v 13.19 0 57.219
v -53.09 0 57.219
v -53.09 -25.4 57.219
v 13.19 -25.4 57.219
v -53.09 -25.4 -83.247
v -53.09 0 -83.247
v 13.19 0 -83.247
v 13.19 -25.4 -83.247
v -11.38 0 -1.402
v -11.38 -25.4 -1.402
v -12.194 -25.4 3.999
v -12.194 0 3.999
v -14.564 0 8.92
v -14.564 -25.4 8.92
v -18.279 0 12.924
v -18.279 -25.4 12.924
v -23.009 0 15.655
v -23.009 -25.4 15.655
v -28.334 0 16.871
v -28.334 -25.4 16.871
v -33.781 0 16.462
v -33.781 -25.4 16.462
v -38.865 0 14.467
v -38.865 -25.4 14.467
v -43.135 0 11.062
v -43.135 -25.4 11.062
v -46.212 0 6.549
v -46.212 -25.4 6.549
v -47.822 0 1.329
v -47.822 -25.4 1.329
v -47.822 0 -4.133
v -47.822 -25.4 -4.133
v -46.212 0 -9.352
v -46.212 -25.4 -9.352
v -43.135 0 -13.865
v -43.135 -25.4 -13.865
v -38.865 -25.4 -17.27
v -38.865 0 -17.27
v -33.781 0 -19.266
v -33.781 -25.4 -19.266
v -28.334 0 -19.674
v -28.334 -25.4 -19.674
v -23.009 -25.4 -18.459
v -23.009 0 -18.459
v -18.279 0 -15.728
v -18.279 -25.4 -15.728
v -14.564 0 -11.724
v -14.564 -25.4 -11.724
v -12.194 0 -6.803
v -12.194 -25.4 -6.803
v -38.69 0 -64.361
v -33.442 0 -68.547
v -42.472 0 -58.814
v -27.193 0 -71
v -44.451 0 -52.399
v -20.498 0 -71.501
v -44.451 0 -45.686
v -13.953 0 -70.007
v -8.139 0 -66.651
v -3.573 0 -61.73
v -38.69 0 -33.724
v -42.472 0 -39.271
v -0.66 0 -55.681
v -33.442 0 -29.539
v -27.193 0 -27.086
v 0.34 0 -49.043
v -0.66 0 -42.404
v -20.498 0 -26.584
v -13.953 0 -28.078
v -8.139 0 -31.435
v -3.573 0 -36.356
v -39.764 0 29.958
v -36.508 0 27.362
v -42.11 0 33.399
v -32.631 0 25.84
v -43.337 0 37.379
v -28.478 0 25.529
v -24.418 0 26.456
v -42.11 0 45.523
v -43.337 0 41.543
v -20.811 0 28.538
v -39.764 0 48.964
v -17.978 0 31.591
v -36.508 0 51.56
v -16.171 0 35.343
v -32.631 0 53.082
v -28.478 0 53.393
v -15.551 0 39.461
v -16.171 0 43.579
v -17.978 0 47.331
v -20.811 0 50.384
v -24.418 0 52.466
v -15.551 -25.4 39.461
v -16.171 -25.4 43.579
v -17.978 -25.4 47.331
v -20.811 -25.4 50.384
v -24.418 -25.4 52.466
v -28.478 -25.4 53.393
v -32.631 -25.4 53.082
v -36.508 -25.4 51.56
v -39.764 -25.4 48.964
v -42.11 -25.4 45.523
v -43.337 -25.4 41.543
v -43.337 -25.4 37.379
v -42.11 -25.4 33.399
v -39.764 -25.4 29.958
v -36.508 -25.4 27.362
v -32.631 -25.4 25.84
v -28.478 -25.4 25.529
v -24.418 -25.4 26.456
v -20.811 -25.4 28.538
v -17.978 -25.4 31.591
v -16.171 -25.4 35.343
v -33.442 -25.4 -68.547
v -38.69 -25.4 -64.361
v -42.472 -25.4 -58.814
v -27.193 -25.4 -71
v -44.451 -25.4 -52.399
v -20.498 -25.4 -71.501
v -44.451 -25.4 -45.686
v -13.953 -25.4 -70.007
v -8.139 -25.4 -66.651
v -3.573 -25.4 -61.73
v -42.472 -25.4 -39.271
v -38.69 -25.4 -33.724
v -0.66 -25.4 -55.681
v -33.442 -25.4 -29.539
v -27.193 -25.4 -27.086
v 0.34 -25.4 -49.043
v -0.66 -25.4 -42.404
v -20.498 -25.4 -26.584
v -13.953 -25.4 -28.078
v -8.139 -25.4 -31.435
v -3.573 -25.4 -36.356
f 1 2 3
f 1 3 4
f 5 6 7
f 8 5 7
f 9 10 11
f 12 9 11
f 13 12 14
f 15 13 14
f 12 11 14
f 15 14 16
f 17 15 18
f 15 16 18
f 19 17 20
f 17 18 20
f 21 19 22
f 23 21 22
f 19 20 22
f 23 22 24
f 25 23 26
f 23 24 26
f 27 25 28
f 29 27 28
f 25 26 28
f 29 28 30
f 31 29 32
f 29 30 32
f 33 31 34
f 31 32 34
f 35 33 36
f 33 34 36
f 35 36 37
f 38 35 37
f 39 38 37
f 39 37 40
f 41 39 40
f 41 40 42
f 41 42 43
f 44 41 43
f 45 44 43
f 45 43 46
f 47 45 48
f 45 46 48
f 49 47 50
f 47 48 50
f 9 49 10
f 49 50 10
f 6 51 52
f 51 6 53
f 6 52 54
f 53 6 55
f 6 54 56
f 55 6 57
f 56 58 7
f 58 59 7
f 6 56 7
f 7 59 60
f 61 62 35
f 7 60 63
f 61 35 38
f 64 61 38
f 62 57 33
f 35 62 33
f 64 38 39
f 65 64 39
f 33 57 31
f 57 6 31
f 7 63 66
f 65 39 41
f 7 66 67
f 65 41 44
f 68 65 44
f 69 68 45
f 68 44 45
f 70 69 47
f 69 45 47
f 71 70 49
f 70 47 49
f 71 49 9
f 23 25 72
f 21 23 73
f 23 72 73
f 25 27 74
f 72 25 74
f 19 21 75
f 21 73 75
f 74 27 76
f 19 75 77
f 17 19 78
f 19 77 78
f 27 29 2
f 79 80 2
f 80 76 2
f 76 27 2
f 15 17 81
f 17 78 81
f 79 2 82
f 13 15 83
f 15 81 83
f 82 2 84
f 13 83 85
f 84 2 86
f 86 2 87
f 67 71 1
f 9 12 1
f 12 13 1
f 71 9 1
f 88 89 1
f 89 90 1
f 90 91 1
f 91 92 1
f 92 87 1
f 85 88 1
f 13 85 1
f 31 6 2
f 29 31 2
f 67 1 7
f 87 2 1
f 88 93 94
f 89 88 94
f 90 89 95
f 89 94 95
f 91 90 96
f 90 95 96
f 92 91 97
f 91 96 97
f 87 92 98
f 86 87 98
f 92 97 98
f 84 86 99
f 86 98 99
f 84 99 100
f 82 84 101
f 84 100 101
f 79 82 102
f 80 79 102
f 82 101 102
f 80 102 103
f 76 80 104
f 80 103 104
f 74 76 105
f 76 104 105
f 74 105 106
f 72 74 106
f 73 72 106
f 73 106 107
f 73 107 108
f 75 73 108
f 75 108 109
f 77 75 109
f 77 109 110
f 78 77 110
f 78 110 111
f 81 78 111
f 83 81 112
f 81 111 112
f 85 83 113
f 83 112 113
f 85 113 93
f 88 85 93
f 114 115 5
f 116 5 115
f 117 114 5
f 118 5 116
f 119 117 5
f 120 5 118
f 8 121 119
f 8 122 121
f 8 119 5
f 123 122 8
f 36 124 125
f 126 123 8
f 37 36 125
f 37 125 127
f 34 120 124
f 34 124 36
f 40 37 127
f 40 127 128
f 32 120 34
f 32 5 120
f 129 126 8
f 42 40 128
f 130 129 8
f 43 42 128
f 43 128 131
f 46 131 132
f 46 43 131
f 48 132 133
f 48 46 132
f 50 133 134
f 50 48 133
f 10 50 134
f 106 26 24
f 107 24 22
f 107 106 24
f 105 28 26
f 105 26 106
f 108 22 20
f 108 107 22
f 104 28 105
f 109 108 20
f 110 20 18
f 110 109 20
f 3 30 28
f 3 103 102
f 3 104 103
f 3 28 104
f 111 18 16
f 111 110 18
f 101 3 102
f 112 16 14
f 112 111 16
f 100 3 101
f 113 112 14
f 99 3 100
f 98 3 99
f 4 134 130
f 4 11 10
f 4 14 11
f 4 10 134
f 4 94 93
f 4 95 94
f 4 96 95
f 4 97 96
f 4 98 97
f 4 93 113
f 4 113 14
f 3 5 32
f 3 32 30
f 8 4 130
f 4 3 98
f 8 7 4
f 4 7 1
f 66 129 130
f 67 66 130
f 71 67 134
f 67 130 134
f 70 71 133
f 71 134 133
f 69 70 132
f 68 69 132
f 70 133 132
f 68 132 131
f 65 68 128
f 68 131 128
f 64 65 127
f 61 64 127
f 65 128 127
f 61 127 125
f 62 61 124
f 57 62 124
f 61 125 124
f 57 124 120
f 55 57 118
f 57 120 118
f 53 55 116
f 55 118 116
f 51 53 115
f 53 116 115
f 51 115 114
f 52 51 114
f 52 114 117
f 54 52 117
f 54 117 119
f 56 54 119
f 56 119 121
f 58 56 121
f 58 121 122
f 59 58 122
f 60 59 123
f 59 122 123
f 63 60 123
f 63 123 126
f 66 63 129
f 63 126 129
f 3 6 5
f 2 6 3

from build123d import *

# Parameters (mm, degrees)
F0_W      = 66.279934
F0_H      = 140.466083
F1_DEPTH  = 25.4
F2_R      = 13.971168
F3_DEPTH  = 25.4
F4_R      = 19.032879
F5_DEPTH  = 25.4
F5_FACE_R = 19.032879
F6_DEPTH  = 25.4
F7_R      = 18.323501
F7_R_2    = 22.521458
F8_DEPTH  = 25.4


with BuildPart() as f1:
    # F0 (on Front) → F1 (new body)
    with BuildSketch(Plane.XZ):
        with Locations((-19.949931, -13.01357)):
            Rectangle(F0_W, F0_H)
    extrude(amount=F1_DEPTH)

    # F2 (on face) → F3 (cut)
    with BuildSketch(Plane.XZ.offset(25.4)):
        with Locations((-29.521925, 39.461106)):
            Circle(F2_R)
    extrude(amount=-F3_DEPTH, mode=Mode.SUBTRACT)

    # F4 (on face) → F5 (join)
    with BuildSketch(Plane.XZ.offset(25.4)):
        with Locations((-25.564913, -7.869989)):
            Circle(F4_R)
    extrude(amount=F5_DEPTH)

    # F5_face (on face) → F6 (cut)
    with BuildSketch(Plane(origin=(-25.564913, -50.8, -7.869989), x_dir=(1, 0, 0), z_dir=(0, -1, 0))):
        Circle(F5_FACE_R)
    extrude(amount=-F6_DEPTH, mode=Mode.SUBTRACT)

    # F7 (on face) → F8 (cut)
    with BuildSketch(Plane.XZ.offset(25.4)):
        with Locations((-29.70336, -1.401637)):
            Circle(F7_R)
        with Locations((-22.181081, -49.042739)):
            Circle(F7_R_2)
    extrude(amount=-F8_DEPTH, mode=Mode.SUBTRACT)


solid = f1.part
